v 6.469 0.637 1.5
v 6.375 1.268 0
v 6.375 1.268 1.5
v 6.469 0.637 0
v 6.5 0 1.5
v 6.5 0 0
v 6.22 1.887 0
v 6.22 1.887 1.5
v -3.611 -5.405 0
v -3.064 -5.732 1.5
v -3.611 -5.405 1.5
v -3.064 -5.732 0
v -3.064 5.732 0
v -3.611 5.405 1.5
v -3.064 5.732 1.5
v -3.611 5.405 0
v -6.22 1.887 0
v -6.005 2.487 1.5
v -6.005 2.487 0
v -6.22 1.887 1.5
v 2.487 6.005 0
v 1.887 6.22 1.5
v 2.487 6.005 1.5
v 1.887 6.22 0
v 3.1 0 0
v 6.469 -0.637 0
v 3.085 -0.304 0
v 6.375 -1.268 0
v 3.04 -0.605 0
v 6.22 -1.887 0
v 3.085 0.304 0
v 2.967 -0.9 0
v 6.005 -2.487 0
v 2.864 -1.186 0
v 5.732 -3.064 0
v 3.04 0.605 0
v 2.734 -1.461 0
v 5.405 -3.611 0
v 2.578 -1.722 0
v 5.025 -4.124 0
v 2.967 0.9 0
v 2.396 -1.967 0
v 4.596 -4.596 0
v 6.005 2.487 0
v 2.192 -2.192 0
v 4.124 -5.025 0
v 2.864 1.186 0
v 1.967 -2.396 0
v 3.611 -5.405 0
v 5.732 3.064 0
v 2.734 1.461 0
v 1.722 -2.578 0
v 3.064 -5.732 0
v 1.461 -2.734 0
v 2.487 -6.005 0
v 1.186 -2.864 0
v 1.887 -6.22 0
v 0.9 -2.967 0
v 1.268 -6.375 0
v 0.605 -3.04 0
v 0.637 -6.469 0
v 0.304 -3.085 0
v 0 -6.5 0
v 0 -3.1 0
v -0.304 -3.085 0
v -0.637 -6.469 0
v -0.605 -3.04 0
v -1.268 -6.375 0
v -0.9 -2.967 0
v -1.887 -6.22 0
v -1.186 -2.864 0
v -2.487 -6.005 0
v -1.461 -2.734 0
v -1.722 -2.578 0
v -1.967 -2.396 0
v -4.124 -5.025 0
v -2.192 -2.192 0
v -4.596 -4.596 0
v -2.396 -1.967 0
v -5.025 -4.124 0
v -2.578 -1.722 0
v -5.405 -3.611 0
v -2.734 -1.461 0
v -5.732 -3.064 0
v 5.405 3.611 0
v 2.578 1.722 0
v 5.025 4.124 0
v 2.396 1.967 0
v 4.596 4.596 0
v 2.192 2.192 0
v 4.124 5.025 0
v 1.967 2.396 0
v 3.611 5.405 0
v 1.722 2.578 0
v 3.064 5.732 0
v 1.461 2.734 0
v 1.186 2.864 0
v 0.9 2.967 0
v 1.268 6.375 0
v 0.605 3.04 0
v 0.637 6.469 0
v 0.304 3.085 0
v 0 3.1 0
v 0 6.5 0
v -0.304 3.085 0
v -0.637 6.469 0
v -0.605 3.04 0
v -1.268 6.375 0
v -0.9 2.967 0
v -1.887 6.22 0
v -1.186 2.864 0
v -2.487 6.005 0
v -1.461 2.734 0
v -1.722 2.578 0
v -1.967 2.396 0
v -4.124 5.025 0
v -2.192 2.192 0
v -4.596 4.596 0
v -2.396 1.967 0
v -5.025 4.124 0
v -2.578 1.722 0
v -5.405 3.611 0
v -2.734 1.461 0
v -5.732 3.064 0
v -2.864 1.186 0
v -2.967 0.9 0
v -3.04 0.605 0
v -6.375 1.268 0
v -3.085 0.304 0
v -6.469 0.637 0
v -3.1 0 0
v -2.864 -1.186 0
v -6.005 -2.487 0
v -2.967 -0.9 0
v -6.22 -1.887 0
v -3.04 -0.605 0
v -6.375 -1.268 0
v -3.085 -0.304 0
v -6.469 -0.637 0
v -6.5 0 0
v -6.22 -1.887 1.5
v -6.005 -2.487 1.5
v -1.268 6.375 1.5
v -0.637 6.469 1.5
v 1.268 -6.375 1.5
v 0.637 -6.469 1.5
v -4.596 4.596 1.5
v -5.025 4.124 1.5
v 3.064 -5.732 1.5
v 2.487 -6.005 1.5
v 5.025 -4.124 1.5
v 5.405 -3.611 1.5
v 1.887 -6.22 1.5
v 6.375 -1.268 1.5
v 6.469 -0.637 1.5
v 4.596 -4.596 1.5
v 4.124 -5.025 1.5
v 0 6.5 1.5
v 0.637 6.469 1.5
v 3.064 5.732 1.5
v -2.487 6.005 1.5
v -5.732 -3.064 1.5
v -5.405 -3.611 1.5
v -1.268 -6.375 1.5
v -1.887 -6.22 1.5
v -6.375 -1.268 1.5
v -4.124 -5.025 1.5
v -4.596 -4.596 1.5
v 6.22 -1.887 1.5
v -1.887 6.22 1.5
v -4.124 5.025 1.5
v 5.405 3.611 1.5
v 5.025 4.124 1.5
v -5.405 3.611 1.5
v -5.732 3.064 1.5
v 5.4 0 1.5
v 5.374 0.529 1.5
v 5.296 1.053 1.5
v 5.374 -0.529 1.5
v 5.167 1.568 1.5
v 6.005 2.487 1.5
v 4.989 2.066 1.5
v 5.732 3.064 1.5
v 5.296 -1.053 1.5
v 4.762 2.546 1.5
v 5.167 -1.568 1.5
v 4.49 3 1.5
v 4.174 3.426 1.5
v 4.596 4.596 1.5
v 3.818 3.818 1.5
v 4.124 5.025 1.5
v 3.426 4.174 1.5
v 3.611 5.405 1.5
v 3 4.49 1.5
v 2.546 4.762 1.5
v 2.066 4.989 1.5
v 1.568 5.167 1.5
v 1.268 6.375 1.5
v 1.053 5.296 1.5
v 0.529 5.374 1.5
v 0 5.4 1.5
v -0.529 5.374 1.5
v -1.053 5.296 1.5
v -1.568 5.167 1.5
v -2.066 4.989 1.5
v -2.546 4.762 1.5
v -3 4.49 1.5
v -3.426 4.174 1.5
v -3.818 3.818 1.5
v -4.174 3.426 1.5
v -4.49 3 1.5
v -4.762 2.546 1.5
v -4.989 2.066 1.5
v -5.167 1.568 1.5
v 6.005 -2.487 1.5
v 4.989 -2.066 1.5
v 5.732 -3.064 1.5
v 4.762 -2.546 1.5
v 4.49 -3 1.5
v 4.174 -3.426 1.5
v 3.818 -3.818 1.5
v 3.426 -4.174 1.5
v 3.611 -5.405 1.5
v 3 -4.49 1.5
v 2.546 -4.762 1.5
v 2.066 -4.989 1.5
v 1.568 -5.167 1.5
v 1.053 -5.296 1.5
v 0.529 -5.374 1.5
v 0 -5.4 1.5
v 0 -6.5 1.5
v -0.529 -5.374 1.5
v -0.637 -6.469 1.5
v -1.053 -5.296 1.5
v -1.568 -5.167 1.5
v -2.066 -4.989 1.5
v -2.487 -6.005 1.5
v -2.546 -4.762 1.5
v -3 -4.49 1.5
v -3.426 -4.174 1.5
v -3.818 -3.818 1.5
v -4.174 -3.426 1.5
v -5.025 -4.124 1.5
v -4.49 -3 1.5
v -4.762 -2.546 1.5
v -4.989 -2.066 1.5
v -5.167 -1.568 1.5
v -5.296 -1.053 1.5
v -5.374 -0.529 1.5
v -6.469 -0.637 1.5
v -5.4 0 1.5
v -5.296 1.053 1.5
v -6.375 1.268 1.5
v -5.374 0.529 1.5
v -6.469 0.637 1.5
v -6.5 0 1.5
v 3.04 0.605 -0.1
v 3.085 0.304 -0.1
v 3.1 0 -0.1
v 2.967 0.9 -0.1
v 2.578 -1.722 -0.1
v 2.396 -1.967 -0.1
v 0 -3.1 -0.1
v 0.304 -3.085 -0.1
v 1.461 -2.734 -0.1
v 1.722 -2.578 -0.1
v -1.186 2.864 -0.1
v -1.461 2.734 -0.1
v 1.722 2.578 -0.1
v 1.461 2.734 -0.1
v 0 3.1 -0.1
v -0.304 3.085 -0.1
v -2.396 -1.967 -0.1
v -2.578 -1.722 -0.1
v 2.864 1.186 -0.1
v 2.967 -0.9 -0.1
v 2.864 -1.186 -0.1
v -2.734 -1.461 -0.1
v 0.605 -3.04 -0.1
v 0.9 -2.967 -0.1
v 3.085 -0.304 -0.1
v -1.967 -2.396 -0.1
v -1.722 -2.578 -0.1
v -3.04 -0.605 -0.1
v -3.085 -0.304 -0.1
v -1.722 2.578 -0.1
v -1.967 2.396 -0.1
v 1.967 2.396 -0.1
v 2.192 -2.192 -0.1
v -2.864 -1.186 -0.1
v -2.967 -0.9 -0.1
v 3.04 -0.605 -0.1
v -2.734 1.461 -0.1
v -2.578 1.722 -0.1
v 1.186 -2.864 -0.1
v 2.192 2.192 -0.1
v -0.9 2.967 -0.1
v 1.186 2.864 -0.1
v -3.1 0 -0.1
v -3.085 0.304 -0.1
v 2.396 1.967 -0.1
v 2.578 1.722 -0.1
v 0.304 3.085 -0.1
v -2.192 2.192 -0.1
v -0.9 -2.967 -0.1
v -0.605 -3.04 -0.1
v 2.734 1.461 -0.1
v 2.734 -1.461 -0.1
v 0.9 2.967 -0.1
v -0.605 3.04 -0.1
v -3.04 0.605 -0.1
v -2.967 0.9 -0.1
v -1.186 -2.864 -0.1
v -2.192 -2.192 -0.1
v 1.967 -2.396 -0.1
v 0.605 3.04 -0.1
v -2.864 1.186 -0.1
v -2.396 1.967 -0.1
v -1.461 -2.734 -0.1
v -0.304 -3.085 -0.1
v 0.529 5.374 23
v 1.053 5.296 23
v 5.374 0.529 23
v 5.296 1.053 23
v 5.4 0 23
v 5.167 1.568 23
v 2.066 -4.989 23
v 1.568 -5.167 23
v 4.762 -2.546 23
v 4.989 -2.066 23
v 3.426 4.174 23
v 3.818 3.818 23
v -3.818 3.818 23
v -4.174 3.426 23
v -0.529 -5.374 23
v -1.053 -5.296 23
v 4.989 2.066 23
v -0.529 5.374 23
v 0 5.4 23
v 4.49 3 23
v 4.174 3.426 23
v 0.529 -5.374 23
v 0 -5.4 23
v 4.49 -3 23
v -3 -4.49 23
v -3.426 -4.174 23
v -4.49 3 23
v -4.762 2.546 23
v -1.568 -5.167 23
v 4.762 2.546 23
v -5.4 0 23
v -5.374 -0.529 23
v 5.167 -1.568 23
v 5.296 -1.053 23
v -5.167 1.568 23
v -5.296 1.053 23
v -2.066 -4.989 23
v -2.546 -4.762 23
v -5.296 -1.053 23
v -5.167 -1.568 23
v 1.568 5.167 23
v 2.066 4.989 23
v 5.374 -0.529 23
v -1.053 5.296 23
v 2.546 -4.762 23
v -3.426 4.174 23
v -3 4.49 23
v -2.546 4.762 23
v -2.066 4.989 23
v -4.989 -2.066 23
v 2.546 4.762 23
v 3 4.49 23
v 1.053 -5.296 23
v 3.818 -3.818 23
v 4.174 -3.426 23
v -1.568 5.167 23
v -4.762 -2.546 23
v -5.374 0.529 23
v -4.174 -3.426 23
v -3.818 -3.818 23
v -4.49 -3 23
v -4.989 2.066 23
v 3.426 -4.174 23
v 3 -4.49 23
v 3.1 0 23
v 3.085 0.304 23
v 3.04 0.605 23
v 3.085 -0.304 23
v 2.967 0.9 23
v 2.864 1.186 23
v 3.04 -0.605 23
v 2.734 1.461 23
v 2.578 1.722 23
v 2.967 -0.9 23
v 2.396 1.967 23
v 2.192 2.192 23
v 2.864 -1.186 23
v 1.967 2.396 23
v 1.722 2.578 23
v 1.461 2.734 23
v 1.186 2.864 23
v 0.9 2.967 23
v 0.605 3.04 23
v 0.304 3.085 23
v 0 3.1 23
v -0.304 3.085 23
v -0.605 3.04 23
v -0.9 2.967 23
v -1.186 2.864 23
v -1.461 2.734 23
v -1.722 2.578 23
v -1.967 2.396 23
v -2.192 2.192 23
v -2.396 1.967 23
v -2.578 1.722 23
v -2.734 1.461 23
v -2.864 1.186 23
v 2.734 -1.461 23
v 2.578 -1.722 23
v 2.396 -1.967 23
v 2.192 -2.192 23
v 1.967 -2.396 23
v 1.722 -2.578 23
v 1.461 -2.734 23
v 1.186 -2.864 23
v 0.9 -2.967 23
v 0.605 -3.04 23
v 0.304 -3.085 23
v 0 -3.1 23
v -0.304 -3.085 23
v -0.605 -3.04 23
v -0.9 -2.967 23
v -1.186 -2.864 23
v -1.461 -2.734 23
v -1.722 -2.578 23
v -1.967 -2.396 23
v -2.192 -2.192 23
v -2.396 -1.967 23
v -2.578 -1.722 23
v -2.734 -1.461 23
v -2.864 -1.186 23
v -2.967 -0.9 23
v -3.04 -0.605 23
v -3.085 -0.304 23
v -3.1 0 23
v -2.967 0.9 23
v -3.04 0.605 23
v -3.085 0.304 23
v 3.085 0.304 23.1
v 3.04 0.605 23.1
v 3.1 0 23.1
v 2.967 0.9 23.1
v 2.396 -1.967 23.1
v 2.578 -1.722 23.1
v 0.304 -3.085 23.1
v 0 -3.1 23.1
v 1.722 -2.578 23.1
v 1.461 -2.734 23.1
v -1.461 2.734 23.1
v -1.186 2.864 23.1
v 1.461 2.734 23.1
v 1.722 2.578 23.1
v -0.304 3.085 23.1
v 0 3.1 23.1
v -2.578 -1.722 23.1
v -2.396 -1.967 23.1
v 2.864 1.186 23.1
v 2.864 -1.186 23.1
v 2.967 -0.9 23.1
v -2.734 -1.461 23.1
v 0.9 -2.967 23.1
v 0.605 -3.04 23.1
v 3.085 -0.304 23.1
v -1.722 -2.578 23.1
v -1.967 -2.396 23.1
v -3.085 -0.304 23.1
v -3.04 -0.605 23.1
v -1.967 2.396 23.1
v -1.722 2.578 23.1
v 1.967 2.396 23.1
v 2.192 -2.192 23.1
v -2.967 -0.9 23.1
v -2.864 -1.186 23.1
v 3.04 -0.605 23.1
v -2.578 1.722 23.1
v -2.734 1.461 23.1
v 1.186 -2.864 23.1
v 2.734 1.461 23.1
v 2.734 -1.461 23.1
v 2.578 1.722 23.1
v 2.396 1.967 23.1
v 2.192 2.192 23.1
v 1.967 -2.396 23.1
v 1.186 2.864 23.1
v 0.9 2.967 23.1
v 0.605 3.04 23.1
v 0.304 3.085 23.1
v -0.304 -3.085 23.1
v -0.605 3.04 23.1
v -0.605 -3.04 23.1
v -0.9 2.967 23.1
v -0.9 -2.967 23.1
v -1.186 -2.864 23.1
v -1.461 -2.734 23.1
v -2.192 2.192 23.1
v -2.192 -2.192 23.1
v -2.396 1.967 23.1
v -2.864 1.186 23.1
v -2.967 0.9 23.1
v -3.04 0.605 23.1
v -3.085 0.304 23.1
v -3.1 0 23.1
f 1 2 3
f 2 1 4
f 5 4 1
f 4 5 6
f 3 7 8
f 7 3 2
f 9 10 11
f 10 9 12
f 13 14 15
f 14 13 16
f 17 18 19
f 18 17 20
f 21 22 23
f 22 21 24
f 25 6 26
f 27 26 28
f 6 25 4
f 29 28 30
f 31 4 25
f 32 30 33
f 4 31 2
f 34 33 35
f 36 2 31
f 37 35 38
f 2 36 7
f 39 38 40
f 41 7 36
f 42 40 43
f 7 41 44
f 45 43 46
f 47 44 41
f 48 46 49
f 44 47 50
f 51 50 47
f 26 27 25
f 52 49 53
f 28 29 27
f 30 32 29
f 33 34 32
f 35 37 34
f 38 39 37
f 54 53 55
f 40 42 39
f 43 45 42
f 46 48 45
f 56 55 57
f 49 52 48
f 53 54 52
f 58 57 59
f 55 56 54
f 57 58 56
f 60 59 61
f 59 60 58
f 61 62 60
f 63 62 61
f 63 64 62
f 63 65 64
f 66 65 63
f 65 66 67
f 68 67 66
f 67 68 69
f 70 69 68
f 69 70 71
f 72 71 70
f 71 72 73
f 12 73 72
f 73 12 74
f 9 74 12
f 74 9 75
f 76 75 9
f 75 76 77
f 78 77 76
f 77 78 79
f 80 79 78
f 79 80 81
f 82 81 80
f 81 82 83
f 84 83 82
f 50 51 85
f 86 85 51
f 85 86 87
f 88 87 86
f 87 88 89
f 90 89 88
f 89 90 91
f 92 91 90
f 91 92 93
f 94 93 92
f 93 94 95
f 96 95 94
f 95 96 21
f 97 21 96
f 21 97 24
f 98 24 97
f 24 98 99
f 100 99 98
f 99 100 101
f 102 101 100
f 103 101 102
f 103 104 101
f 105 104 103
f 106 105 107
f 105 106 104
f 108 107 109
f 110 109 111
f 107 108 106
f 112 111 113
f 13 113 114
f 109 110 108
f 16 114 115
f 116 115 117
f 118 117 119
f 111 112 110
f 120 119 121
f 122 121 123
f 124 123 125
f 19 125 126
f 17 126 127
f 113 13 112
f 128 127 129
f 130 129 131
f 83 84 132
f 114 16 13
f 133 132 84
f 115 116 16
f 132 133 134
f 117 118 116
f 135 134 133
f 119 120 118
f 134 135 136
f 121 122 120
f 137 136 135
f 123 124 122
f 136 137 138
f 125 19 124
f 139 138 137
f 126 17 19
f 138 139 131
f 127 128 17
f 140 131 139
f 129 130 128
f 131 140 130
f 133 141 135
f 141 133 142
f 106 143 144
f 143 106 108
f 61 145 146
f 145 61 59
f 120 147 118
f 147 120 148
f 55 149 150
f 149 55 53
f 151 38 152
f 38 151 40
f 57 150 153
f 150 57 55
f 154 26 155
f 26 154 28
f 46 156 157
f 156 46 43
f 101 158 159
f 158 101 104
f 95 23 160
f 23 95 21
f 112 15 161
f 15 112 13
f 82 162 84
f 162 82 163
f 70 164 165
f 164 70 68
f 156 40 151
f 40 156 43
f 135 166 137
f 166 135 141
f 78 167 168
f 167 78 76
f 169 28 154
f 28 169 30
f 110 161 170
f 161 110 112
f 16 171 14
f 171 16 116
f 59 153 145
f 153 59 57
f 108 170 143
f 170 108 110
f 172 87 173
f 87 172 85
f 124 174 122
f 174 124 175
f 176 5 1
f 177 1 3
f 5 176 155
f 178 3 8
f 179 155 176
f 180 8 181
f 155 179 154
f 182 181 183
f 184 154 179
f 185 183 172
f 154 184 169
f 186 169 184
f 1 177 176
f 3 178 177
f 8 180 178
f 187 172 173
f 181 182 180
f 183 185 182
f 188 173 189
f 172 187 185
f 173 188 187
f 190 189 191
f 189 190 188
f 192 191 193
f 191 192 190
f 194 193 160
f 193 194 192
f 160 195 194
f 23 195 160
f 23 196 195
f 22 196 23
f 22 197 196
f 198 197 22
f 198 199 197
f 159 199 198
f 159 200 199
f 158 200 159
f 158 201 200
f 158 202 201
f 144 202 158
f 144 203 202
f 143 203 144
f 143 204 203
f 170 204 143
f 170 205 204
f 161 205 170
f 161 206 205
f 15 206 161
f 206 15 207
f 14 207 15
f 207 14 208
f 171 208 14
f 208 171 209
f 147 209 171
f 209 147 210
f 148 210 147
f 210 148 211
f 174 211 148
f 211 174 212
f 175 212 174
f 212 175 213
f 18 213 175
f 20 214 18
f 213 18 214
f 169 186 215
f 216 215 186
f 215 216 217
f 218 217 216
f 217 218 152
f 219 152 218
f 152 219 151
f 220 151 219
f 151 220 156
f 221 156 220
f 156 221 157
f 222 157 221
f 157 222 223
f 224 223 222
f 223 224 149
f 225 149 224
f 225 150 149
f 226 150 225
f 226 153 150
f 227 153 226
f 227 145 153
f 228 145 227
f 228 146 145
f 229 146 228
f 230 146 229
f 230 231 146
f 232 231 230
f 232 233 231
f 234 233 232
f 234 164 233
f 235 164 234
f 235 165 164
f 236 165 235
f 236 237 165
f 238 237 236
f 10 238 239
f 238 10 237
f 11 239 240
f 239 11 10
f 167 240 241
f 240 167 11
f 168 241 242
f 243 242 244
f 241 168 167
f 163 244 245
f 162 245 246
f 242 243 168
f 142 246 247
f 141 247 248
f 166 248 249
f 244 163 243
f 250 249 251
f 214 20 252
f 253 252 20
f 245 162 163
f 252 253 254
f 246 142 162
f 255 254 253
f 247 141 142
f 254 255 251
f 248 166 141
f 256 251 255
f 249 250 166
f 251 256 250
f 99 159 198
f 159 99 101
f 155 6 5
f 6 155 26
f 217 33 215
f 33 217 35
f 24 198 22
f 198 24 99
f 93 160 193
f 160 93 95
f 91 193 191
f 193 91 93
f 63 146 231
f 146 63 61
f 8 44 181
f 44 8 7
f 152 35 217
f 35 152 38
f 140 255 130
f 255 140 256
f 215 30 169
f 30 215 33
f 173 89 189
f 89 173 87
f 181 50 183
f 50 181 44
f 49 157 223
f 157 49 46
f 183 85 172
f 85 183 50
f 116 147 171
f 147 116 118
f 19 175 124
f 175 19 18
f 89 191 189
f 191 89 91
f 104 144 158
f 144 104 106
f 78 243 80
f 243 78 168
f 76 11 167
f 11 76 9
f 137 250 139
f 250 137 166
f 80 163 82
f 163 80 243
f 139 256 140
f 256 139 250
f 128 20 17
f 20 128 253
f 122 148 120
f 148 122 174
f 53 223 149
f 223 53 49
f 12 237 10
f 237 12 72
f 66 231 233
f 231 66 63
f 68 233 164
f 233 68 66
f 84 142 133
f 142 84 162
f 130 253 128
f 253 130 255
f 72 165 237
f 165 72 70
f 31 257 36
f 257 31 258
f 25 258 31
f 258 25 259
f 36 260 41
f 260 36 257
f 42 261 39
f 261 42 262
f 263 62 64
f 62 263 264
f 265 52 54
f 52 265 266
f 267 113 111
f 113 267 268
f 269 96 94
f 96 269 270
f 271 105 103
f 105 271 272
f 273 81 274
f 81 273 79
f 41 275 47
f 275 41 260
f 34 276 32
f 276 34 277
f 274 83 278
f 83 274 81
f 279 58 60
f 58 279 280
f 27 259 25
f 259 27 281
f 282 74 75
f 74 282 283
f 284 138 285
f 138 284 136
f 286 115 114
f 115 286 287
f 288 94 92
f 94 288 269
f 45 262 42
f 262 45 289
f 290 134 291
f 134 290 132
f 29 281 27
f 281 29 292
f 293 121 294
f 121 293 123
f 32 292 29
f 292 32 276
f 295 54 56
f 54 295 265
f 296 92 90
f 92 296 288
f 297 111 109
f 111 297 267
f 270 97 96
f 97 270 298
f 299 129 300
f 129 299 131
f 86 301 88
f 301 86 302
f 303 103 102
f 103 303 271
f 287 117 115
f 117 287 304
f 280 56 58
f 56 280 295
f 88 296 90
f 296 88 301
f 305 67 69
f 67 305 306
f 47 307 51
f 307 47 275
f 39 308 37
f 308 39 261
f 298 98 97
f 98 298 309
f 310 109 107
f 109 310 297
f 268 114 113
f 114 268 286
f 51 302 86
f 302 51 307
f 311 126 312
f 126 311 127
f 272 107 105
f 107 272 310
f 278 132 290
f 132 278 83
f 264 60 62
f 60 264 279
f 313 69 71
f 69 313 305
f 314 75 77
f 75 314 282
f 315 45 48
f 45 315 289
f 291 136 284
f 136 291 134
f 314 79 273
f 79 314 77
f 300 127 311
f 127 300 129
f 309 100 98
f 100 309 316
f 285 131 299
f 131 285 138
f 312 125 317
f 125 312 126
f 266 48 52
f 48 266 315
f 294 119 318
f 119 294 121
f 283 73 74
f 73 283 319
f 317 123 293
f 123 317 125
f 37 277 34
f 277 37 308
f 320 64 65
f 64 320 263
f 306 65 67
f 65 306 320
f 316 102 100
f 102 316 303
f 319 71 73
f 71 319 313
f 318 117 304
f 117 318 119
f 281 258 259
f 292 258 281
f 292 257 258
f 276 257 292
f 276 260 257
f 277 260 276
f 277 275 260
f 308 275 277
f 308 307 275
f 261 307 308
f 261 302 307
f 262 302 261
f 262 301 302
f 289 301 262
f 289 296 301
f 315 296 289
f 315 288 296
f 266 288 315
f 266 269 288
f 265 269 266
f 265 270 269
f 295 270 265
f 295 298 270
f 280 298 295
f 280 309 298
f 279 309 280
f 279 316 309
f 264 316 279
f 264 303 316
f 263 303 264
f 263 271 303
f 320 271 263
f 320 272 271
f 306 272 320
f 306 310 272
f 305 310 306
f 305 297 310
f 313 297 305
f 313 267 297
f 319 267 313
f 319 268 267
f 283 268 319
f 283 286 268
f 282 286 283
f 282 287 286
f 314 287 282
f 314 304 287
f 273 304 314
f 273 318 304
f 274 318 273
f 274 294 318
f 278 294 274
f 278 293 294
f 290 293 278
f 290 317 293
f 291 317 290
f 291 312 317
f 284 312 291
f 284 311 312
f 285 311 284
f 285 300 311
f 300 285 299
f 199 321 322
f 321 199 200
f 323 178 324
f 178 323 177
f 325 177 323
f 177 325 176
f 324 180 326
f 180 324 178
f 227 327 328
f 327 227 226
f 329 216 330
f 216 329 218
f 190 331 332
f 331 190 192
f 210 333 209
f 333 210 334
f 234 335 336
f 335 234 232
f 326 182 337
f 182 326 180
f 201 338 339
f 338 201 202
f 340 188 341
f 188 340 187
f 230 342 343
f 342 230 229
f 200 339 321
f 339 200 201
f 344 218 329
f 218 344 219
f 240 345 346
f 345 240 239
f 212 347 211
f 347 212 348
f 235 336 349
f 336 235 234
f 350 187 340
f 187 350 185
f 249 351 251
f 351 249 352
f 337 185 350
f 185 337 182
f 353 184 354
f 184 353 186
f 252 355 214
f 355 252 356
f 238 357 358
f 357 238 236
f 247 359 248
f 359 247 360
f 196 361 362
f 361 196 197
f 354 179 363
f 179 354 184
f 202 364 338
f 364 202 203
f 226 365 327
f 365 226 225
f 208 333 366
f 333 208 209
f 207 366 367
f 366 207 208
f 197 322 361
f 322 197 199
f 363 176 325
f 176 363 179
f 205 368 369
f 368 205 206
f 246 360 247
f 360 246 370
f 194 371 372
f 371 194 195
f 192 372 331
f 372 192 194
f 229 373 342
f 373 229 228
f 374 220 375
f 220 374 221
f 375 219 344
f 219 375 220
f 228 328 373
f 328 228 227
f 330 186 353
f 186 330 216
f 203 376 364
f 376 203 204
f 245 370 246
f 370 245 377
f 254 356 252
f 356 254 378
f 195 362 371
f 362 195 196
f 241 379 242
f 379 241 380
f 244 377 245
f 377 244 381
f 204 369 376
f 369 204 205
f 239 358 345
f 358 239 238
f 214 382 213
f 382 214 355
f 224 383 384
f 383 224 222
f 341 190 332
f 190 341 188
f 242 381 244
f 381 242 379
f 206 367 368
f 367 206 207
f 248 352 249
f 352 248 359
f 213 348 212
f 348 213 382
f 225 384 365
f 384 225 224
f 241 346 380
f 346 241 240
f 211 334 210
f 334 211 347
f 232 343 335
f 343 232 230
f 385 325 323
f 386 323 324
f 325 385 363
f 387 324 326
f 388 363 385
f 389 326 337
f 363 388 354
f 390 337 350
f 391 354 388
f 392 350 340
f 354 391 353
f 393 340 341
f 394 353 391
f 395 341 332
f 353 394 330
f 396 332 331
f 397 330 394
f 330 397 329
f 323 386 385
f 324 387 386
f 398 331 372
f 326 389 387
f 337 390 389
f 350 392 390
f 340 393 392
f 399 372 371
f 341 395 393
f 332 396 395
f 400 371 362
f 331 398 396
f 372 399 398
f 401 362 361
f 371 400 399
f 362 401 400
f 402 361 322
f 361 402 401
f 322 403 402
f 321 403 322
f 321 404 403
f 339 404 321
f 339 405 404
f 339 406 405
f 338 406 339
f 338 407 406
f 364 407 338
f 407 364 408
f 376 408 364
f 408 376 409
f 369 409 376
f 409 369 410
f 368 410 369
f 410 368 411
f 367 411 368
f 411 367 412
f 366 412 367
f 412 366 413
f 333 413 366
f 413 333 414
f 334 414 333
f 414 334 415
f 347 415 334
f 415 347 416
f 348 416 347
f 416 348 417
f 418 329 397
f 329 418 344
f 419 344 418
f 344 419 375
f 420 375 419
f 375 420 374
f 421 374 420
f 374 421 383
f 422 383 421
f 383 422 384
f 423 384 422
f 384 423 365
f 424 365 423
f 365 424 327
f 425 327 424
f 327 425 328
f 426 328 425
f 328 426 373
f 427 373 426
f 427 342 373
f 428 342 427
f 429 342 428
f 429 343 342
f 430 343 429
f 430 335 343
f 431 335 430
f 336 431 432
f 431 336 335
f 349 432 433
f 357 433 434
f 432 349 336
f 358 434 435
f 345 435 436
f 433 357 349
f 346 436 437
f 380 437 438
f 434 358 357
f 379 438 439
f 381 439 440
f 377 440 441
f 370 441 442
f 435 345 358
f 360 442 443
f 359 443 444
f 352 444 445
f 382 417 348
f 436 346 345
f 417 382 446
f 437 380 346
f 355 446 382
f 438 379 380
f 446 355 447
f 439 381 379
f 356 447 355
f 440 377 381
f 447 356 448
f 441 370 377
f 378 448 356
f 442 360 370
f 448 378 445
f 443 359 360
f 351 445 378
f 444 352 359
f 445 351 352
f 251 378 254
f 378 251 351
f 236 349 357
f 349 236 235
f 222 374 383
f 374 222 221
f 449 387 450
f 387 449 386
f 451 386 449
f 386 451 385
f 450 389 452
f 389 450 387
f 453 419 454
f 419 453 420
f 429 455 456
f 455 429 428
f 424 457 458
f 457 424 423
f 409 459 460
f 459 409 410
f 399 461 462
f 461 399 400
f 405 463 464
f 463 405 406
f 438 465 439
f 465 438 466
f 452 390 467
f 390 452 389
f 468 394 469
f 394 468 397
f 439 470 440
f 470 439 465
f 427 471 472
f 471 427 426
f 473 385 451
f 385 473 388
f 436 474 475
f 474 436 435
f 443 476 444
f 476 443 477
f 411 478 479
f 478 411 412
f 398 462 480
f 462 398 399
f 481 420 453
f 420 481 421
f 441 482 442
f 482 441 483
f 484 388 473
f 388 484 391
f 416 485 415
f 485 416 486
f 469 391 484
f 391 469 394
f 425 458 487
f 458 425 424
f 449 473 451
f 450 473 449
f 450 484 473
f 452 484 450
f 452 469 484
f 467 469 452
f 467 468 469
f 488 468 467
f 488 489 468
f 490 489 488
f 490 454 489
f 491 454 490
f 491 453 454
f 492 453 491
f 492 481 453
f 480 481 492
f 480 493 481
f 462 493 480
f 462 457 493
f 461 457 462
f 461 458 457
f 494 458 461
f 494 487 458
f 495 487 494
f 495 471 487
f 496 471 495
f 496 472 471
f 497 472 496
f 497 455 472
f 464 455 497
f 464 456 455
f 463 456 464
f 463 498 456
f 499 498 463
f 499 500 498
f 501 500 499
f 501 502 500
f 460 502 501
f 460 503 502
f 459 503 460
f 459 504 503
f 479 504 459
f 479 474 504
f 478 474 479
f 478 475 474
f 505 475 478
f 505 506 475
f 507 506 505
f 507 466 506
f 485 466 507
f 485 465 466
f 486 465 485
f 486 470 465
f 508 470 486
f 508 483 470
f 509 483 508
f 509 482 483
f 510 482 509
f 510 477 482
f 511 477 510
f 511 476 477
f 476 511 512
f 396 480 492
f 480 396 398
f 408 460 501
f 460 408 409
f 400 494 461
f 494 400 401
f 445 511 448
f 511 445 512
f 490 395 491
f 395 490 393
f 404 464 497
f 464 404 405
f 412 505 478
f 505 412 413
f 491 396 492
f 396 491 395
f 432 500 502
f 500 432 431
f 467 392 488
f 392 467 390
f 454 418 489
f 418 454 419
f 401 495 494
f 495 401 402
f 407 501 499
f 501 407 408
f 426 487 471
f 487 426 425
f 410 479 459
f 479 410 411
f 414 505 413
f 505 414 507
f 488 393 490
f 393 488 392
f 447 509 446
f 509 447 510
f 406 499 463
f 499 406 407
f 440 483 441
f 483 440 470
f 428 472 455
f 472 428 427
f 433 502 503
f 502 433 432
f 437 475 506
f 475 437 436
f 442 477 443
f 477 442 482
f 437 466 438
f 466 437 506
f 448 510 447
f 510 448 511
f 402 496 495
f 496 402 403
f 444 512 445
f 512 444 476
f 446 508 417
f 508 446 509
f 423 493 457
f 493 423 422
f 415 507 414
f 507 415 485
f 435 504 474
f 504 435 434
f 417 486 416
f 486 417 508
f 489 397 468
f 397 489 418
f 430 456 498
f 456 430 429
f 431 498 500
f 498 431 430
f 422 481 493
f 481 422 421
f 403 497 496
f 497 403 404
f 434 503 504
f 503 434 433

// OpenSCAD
// Adapter sleeve for 0.2 mL PCR tube in 1.5 mL rack hole
// Print orientation: upside down (collar on bed, sleeve body upward)

// Dimensions
collar_diameter = 13;       // mm, outer diameter of collar
collar_thickness = 1.5;     // mm, height of collar
sleeve_od = 10.8;           // mm, outer diameter of sleeve body
sleeve_height = 21.5;       // mm, height of sleeve body (from collar top to top of sleeve)
bore_diameter = 6.2;        // mm, inner bore diameter
wall_thickness = (collar_diameter - sleeve_od) / 2; // mm, wall thickness at collar

// Resolution
$fn = 64;

// Collar (bottom part)
collar_height = collar_thickness;
collar_radius = collar_diameter / 2;
sleeve_radius = sleeve_od / 2;
bore_radius = bore_diameter / 2;

// Build collar
module collar_part() {
    translate([0, 0, 0]) {
        cylinder(h = collar_height, r = collar_radius, center = false);
        // Subtract bore
        translate([0, 0, -0.1]) {
            cylinder(h = collar_height + 0.2, r = bore_radius, center = false);
        }
    }
}

// Build sleeve body (on top of collar)
module sleeve_body() {
    translate([0, 0, collar_height]) {
        cylinder(h = sleeve_height, r = sleeve_radius, center = false);
        // Subtract bore
        translate([0, 0, -0.1]) {
            cylinder(h = sleeve_height + 0.2, r = bore_radius, center = false);
        }
    }
}

// Combine parts
collar_part();
sleeve_body();
